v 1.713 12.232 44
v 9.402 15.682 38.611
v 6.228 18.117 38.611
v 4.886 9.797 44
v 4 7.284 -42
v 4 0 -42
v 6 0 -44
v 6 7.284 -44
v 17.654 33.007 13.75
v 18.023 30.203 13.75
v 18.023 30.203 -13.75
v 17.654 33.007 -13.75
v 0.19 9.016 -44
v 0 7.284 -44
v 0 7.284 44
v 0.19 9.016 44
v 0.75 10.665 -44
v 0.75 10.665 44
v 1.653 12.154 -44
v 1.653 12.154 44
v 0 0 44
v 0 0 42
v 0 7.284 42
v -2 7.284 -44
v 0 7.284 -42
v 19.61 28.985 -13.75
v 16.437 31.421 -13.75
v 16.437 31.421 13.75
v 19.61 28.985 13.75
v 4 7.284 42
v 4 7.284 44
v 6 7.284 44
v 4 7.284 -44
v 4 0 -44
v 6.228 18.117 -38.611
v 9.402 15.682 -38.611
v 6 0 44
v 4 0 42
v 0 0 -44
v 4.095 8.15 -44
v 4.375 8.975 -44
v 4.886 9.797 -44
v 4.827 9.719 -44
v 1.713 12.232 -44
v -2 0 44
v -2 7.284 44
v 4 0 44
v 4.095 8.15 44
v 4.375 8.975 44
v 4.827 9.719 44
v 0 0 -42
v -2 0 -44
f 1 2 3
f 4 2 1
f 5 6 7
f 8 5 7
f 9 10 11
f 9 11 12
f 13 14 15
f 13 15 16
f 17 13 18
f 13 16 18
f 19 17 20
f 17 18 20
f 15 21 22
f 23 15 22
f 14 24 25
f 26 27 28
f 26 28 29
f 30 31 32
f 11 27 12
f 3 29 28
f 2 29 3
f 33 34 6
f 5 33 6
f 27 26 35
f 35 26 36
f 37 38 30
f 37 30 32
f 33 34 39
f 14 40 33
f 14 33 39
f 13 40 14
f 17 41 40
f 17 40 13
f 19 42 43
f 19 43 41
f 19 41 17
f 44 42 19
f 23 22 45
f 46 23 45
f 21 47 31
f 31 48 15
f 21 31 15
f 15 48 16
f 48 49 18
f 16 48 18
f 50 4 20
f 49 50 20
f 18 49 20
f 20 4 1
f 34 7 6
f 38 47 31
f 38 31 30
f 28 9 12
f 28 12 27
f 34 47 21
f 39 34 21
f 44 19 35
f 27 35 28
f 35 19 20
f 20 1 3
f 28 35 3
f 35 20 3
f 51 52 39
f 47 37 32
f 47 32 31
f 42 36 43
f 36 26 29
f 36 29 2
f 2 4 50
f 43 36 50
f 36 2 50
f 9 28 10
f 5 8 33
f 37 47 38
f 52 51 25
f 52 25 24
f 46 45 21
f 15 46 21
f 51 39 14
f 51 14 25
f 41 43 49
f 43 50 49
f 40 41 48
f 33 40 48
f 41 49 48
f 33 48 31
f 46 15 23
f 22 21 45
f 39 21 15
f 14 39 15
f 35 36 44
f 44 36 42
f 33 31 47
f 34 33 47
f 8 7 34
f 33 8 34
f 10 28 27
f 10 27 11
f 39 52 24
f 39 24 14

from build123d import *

# Parameters (mm, degrees)
SM_BASE_FLANGE_1_DEPTH = 44
CUT_EXTRUDE_1_DEPTH    = 58.421720735
EXTRUDE_START          = 13.75
EXTRUDE_2_DEPTH        = 27.5
EXTRUDE_3_DEPTH        = 7.284366
EXTRUDE_3_2_DEPTH      = 7.284366
EXTRUDE_3_3_DEPTH      = 7.284366
EXTRUDE_3_4_DEPTH      = 7.284366


# Sheet-metal steps are written as plain solids
with BuildPart() as part:
    # Sketch 1 → Базовая кромка1 (new, symmetric)
    with BuildSketch(Plane.XY):
        with BuildLine():
            Line((0, 0), (0, 7.284365929))
            ThreePointArc((0, 7.284365929), (0.424558964, 9.855881652), (1.653173278, 12.154457361))
            Line((1.653173278, 12.154457361), (16.436558583, 31.420540188))
            Line((16.436558583, 31.420540188), (19.609971944, 28.985494472))
            Line((19.609971944, 28.985494472), (4.826586639, 9.719411645))
            ThreePointArc((4.826586639, 9.719411645), (4.212279482, 8.57012379), (4, 7.284365929))
            Line((4, 7.284365929), (4, 0))
            Line((4, 0), (0, 0))
        make_face()
    extrude(amount=SM_BASE_FLANGE_1_DEPTH, both=True)

    # Эскиз3 → Вытянуть1 (cut, through all)
    with BuildSketch(Plane(origin=(-1.65621577, 1.270859058, 0), x_dir=(0, 0, -1), z_dir=(0.7933533402912344, -0.6087614290087218, 0))):
        Polygon((-44, 10.74743452), (-44, 34.933533403), (-13.75, 34.933533403), (-38.611255778, 18.164404641), align=None)
        Polygon((44, 34.933533403), (13.75, 34.933533403), (38.611255778, 18.164404641), (44, 10.74743452), align=None)
    extrude(amount=-CUT_EXTRUDE_1_DEPTH, mode=Mode.SUBTRACT)


with BuildPart() as body_2:
    # Эскиз4 → Вытянуть2 (new body)
    with BuildSketch(Plane.XY.offset(EXTRUDE_START)):
        Polygon((16.436558583, 31.420540188), (18.023265264, 30.20301733), (17.654081441, 33.007246868), align=None)
    extrude(amount=-EXTRUDE_2_DEPTH)


with BuildPart() as body_3:
    # Эскиз5 → Вытянуть3 (new body)
    with BuildSketch(Plane.XZ):
        Polygon((0, 44), (0, 42), (-2, 44), align=None)
    extrude(amount=-EXTRUDE_3_DEPTH)


with BuildPart() as body_4:
    # Эскиз5 → Extrude 3 2 (new body)
    with BuildSketch(Plane.XZ):
        Polygon((6, 44), (4, 44), (4, 42), align=None)
    extrude(amount=-EXTRUDE_3_2_DEPTH)


with BuildPart() as body_5:
    # Эскиз5 → Extrude 3 3 (new body)
    with BuildSketch(Plane.XZ):
        Polygon((4, -44), (4, -42), (6, -44), align=None)
    extrude(amount=-EXTRUDE_3_3_DEPTH)


with BuildPart() as body_6:
    # Эскиз5 → Extrude 3 4 (new body)
    with BuildSketch(Plane.XZ):
        Polygon((-2, -44), (0, -44), (0, -42), align=None)
    extrude(amount=-EXTRUDE_3_4_DEPTH)


solid = Compound([part.part, body_2.part, body_3.part, body_4.part, body_5.part, body_6.part])
